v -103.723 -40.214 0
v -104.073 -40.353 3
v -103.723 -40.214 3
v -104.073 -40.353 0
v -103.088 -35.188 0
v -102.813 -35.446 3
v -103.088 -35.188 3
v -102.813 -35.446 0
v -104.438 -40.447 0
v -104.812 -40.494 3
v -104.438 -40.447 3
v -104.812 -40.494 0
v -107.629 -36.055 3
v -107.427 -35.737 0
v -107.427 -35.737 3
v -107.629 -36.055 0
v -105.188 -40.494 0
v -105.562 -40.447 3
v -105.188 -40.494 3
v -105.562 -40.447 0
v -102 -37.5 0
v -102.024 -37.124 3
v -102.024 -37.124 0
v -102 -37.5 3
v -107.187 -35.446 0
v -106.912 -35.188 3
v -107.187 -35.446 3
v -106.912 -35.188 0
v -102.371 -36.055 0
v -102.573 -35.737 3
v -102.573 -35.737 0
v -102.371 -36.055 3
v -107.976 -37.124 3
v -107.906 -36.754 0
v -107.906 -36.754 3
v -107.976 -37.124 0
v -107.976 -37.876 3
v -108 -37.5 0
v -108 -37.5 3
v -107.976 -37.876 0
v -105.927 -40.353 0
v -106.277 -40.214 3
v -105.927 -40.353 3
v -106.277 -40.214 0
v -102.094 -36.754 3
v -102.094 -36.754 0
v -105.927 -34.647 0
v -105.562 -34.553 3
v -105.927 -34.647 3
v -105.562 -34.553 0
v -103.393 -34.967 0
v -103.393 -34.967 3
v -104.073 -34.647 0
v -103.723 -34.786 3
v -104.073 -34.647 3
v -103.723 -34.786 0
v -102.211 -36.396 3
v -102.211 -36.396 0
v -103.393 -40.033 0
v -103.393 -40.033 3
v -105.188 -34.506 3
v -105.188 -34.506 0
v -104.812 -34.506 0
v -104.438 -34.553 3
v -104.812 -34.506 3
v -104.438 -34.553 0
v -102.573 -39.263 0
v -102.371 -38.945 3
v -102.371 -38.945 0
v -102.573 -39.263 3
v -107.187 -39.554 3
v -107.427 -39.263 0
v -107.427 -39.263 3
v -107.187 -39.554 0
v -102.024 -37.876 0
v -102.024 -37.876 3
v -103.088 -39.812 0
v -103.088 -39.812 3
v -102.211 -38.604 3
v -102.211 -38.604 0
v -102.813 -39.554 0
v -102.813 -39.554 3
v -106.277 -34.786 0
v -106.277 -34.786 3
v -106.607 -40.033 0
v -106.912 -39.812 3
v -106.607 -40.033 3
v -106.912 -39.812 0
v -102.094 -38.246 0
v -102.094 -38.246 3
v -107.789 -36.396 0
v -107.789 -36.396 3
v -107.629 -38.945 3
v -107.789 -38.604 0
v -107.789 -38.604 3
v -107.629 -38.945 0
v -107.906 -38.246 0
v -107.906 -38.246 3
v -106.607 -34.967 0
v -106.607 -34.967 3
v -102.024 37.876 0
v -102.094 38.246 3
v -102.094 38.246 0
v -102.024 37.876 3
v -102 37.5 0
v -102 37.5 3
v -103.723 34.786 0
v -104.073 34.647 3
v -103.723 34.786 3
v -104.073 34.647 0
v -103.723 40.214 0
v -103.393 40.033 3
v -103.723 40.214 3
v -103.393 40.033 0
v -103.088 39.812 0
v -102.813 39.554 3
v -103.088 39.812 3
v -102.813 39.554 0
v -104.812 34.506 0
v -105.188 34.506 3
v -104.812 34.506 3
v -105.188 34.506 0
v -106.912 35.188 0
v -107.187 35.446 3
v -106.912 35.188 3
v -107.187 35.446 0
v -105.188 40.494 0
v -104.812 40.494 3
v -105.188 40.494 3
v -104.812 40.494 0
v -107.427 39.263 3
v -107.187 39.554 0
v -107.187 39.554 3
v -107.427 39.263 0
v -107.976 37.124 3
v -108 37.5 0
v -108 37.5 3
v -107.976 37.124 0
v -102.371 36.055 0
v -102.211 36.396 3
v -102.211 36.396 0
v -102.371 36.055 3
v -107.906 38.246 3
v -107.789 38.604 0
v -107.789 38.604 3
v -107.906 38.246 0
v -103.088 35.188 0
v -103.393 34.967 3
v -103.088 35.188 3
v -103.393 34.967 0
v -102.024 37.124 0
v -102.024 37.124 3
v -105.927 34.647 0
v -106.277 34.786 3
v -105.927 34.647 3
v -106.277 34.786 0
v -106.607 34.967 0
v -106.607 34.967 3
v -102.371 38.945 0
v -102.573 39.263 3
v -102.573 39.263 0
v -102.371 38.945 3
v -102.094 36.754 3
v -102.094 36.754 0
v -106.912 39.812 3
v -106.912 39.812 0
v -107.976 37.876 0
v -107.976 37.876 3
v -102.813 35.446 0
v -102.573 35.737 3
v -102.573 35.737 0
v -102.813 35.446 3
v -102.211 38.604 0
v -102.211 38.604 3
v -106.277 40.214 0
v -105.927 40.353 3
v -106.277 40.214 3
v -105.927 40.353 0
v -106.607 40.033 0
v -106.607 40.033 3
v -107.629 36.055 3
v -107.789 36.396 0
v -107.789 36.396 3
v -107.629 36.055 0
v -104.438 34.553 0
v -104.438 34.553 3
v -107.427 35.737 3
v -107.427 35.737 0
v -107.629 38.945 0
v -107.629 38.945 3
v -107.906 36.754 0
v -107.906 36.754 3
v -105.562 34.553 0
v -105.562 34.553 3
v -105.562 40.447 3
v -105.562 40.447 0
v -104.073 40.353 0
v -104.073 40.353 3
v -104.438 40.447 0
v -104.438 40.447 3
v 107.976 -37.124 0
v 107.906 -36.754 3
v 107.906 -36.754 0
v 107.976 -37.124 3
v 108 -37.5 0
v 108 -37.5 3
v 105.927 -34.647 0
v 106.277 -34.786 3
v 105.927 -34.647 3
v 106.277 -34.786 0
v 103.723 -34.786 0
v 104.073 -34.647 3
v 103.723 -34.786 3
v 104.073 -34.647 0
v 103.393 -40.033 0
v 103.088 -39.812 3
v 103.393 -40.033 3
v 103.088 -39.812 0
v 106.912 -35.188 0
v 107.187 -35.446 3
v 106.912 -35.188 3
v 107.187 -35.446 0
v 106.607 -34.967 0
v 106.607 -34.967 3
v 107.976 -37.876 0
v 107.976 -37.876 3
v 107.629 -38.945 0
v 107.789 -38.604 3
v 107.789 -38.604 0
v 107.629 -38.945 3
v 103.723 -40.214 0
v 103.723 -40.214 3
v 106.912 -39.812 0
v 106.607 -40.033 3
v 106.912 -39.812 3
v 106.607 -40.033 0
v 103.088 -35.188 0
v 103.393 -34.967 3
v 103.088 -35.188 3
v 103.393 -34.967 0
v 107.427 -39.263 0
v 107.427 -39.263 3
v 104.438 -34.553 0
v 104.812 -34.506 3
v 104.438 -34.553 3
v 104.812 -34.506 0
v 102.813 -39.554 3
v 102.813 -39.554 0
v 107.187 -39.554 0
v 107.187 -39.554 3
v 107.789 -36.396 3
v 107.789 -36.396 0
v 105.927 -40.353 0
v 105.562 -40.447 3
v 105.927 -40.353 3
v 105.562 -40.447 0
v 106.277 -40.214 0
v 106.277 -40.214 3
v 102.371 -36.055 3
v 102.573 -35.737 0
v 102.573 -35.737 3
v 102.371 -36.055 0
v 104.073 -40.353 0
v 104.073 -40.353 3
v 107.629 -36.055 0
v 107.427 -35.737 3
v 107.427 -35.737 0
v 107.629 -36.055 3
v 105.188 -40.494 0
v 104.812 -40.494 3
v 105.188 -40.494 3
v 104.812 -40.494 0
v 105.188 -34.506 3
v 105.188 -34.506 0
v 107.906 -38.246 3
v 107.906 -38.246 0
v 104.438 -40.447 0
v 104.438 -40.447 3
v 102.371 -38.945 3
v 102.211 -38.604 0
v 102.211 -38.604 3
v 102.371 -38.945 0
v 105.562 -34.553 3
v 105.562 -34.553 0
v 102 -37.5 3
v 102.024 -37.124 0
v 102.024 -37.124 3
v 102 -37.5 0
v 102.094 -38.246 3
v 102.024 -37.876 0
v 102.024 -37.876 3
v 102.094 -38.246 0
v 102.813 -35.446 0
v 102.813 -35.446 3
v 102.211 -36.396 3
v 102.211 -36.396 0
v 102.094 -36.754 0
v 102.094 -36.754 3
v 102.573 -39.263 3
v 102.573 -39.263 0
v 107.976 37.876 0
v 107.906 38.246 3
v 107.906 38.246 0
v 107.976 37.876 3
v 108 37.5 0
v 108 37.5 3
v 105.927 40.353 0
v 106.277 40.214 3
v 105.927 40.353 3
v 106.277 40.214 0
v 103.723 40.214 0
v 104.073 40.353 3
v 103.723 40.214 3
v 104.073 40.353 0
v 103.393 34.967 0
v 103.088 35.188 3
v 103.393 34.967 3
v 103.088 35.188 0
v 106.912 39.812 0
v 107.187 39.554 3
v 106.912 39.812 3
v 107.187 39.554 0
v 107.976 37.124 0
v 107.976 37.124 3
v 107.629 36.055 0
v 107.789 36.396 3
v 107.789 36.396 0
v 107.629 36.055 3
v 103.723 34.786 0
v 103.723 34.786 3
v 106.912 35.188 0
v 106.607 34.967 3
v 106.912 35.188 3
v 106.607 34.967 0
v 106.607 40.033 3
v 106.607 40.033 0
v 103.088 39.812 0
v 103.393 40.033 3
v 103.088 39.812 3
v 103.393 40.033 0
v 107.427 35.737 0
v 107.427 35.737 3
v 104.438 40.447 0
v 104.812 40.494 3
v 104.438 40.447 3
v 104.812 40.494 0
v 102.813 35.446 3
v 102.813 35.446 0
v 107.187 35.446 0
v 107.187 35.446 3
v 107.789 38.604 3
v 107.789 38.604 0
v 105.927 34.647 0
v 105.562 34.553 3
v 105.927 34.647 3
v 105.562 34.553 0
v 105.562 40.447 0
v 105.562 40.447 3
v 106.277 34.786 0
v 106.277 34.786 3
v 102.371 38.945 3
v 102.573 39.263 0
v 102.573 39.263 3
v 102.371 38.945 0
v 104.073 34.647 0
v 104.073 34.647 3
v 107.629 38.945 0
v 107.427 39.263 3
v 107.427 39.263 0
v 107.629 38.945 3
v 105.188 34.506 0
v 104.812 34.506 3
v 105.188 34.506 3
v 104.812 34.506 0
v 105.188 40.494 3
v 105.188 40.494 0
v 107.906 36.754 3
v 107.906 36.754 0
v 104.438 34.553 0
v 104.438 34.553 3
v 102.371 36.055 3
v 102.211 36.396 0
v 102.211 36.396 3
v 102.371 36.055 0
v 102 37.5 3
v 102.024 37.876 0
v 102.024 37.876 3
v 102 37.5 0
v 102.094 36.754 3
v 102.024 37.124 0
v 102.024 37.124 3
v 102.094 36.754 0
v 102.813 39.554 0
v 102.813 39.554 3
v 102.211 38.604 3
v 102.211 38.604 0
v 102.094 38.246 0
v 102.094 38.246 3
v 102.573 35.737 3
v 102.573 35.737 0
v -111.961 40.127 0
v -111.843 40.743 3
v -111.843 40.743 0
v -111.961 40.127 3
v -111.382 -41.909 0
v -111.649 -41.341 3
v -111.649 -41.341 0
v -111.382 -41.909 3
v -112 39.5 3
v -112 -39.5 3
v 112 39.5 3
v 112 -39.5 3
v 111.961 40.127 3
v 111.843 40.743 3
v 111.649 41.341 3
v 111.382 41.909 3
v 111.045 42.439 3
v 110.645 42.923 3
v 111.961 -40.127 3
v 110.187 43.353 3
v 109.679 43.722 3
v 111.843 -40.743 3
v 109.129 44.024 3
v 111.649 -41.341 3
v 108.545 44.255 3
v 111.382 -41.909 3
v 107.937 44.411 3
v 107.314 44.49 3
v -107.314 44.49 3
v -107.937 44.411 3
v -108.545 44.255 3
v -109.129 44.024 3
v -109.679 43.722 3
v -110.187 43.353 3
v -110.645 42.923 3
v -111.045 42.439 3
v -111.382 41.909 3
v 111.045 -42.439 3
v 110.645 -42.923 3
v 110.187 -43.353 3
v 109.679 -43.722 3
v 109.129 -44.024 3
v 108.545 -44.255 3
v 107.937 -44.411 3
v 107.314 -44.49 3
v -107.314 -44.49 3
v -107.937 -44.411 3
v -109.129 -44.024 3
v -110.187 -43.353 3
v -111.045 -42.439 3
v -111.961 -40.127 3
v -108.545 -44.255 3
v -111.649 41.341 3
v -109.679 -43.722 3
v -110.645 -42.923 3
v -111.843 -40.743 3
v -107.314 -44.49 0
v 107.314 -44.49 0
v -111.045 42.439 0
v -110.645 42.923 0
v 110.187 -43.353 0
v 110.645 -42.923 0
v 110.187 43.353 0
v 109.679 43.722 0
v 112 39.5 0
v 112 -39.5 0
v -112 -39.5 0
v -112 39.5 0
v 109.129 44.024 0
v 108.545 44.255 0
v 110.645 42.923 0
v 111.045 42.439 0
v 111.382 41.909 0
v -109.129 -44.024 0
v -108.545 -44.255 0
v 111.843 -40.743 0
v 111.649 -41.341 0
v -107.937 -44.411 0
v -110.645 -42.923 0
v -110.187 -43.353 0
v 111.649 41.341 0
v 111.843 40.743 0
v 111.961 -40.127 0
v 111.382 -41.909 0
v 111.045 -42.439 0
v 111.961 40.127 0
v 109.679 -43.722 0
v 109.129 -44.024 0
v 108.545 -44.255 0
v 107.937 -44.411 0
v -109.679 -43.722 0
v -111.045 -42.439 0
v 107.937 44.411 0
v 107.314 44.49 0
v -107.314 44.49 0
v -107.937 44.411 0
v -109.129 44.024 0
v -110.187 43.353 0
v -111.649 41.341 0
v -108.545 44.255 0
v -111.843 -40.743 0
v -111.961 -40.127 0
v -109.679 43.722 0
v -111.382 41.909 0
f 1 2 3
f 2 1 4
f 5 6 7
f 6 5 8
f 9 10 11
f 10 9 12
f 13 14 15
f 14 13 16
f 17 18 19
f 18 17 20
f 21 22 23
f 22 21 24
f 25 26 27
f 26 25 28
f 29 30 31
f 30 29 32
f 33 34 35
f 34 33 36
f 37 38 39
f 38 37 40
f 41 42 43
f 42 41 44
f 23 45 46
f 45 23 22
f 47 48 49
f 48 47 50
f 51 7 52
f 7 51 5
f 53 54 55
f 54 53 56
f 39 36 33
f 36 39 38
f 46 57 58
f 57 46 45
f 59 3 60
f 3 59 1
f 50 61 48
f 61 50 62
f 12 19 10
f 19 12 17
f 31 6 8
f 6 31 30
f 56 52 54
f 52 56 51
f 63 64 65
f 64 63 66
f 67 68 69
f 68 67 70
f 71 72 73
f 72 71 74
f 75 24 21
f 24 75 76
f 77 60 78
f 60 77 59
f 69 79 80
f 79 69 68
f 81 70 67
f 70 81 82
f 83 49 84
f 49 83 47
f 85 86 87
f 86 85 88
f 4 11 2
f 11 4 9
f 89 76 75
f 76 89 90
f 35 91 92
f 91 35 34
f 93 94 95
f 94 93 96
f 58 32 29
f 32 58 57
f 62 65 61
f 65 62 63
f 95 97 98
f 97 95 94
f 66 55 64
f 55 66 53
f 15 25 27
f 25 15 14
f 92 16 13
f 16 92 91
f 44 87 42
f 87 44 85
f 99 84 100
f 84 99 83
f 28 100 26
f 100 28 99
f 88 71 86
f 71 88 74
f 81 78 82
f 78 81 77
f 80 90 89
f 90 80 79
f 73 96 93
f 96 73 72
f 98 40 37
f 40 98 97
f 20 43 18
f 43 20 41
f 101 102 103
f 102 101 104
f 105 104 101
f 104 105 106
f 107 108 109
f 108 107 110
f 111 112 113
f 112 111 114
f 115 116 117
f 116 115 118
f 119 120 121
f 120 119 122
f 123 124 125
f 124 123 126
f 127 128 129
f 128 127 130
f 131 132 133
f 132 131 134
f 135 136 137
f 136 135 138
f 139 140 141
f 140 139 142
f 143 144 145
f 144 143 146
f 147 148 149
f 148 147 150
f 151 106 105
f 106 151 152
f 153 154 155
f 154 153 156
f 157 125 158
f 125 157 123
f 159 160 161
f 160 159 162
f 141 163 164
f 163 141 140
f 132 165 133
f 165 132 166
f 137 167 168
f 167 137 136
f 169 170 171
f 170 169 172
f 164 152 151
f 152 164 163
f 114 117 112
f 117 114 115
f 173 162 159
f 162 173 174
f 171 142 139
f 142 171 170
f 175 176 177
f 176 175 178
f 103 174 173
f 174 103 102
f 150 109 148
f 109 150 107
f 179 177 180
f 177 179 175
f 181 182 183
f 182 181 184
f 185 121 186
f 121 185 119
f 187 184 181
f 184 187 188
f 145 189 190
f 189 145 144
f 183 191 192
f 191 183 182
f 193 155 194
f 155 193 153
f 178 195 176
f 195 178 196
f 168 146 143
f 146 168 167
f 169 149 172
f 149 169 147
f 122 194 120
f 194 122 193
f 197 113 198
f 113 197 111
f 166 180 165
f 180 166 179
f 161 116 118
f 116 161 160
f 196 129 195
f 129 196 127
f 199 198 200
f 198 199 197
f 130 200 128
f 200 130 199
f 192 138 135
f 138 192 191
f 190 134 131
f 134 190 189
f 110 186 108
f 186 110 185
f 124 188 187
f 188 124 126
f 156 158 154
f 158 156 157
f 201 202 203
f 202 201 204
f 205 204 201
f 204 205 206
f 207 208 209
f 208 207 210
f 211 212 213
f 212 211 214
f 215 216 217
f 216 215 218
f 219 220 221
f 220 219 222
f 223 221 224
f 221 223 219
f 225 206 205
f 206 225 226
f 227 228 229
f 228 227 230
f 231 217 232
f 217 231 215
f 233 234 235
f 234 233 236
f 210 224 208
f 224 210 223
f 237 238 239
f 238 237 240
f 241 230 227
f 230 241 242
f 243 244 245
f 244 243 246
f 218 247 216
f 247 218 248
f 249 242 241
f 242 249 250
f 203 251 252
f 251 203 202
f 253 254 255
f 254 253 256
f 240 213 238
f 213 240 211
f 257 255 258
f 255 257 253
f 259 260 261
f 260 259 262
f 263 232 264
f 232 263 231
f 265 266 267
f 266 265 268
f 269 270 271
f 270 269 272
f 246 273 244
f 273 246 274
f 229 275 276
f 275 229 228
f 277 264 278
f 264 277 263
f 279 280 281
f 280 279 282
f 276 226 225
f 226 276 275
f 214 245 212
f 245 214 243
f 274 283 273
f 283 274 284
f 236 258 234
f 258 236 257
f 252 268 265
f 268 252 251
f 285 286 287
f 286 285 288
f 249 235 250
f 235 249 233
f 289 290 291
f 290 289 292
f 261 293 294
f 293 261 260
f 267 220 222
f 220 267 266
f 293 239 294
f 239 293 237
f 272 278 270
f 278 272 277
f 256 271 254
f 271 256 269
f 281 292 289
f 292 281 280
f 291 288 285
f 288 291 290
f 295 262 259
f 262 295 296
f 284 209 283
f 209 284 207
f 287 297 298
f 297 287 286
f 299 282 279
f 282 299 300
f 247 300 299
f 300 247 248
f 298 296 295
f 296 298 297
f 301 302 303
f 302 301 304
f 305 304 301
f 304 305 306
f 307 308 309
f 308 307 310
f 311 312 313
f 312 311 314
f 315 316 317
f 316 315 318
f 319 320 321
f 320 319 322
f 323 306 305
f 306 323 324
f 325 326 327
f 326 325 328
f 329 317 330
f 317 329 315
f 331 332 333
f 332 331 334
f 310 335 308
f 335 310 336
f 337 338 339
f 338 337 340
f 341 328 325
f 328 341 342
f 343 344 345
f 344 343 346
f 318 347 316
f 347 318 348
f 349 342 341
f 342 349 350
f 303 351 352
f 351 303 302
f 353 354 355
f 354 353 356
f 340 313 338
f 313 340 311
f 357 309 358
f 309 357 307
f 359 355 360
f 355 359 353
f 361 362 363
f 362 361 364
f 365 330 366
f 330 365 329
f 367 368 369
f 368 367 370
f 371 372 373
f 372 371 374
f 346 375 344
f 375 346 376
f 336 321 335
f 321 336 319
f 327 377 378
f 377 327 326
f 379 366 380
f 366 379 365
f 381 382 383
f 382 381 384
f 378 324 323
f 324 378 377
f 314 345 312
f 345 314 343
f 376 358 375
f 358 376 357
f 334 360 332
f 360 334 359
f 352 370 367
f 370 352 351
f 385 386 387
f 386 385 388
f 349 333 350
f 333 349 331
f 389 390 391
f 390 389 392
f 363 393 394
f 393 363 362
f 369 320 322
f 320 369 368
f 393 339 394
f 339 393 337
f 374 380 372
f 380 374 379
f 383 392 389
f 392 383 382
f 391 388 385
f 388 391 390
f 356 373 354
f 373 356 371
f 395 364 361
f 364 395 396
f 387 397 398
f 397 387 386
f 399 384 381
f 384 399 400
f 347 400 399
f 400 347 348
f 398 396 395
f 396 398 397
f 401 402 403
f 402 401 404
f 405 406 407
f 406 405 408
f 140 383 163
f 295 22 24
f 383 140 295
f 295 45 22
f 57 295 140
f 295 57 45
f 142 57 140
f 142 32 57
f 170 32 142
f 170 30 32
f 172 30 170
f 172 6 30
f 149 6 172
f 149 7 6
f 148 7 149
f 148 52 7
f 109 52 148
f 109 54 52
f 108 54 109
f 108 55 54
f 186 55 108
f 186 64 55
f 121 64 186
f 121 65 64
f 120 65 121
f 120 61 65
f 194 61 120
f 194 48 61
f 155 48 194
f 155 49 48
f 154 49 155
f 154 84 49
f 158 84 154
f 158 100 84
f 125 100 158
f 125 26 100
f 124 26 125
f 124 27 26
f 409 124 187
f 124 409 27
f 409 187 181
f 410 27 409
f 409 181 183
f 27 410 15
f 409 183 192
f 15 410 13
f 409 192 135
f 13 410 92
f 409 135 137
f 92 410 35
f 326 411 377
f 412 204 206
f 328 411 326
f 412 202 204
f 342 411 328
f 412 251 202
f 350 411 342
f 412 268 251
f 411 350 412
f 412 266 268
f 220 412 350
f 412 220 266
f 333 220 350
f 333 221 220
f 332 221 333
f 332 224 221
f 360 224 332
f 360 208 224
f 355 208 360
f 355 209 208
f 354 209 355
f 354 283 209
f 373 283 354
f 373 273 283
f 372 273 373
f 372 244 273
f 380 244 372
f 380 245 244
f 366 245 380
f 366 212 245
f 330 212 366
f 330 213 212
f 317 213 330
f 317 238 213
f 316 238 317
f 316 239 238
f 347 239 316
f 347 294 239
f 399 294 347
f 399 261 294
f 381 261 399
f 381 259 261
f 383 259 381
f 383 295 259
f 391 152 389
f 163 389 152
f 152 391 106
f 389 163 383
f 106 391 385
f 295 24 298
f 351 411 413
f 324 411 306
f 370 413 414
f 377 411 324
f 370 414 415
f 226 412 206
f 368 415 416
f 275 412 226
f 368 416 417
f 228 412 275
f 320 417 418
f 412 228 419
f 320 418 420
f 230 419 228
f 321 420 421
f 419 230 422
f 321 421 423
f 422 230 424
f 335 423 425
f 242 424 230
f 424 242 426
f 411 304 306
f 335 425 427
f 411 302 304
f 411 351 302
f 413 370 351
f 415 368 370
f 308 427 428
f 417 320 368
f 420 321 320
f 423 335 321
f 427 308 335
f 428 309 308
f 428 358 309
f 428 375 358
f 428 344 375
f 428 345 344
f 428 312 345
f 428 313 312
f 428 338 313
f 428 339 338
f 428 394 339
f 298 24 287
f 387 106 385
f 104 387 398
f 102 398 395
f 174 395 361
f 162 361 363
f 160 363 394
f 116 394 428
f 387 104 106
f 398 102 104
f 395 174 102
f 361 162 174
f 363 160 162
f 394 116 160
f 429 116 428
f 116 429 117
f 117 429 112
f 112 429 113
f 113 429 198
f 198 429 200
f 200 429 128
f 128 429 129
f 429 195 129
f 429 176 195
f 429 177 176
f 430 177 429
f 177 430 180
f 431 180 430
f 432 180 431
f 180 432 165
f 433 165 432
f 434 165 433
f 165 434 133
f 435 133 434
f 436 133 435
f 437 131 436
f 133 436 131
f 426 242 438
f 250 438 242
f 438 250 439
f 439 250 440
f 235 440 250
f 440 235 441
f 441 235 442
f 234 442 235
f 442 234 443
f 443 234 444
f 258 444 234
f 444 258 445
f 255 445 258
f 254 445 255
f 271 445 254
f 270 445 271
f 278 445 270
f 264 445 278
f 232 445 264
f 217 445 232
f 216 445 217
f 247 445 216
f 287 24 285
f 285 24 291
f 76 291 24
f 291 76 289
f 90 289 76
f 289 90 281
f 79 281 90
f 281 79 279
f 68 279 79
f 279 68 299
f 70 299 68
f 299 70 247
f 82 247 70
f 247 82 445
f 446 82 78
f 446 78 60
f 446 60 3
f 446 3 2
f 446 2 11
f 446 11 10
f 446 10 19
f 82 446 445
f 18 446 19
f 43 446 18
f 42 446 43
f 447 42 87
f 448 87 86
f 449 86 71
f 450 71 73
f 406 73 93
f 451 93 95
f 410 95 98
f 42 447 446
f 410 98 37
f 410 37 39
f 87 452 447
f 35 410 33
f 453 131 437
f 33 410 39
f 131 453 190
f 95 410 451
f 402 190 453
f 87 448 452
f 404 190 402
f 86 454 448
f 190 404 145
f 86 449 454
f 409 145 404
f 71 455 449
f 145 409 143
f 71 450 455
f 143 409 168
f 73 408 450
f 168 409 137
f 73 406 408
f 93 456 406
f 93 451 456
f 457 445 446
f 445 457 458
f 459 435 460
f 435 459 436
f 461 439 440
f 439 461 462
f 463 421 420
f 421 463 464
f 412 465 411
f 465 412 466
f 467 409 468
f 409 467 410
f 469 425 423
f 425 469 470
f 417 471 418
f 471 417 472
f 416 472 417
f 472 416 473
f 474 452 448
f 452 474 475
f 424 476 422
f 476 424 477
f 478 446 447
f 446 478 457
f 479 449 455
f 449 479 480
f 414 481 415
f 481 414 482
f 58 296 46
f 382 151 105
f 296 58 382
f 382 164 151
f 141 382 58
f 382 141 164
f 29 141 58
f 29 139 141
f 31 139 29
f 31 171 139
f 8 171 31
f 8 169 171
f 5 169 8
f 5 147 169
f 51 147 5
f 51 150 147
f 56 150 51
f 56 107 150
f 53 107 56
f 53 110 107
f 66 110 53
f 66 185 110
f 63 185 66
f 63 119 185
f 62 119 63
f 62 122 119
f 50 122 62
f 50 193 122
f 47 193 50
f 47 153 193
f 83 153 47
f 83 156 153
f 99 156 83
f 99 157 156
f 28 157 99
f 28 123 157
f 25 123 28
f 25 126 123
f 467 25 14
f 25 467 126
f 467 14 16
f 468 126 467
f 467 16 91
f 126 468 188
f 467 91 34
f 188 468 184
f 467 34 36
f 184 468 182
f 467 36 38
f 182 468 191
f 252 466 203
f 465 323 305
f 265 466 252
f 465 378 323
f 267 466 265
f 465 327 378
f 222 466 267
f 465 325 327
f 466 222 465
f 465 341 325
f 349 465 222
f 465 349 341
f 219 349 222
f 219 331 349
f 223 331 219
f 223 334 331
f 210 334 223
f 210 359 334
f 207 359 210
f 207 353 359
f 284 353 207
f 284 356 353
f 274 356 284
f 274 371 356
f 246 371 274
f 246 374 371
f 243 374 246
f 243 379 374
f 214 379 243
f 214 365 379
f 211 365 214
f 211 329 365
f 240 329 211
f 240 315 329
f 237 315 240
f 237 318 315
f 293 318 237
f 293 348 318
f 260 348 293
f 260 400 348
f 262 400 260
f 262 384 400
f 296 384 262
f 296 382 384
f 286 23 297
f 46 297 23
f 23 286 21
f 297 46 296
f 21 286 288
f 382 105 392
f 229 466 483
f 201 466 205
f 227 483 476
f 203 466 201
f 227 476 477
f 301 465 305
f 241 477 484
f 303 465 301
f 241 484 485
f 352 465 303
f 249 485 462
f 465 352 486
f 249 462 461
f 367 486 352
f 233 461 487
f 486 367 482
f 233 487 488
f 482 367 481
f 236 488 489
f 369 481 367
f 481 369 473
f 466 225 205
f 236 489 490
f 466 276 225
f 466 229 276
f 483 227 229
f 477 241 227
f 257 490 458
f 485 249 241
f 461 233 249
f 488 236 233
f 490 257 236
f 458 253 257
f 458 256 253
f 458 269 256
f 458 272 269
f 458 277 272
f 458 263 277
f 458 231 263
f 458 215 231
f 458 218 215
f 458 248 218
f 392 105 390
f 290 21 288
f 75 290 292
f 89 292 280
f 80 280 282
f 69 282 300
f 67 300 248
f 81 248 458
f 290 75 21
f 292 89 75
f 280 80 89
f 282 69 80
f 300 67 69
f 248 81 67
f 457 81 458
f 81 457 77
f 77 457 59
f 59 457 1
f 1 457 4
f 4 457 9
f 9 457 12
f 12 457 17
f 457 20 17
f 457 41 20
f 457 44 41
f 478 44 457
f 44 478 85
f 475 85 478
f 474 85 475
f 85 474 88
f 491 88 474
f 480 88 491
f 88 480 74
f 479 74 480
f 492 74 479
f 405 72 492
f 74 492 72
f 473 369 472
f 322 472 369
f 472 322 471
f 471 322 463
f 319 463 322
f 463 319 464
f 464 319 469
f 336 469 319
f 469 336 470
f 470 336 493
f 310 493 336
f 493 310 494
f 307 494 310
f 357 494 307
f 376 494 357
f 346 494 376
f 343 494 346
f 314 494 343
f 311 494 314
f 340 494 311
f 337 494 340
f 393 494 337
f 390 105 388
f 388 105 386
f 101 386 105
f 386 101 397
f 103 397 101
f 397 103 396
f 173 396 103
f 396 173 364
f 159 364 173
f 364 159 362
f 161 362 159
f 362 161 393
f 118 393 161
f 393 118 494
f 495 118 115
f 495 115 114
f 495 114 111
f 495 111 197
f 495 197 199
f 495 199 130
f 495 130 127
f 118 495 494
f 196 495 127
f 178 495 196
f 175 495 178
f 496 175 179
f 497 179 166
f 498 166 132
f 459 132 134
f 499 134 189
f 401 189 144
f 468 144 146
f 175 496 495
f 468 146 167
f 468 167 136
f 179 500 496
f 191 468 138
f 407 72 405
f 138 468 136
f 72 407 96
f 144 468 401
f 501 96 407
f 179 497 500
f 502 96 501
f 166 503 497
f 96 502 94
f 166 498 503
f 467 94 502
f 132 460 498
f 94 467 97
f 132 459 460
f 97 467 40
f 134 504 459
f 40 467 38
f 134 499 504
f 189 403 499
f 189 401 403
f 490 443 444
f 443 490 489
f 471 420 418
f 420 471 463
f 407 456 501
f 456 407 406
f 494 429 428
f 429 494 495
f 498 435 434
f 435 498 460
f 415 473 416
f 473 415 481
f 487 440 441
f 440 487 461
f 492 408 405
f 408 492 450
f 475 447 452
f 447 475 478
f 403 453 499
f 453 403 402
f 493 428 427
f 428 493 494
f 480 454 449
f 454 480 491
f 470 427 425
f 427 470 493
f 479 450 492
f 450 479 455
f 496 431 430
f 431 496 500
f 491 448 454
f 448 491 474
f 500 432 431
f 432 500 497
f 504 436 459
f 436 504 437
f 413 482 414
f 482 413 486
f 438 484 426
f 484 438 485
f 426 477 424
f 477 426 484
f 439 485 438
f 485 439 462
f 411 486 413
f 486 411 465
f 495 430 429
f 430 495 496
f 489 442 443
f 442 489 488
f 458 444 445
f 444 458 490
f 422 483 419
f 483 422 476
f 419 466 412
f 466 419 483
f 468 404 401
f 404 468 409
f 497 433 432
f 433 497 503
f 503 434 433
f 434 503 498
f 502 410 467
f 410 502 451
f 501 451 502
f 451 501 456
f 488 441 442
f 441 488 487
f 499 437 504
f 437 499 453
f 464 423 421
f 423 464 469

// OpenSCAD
$fn = 50;


difference() {
	union() {
		hull() {
			translate(v = [-107.0000000000, 39.5000000000, 0]) {
				cylinder(h = 3, r = 5);
			}
			translate(v = [107.0000000000, 39.5000000000, 0]) {
				cylinder(h = 3, r = 5);
			}
			translate(v = [-107.0000000000, -39.5000000000, 0]) {
				cylinder(h = 3, r = 5);
			}
			translate(v = [107.0000000000, -39.5000000000, 0]) {
				cylinder(h = 3, r = 5);
			}
		}
	}
	union() {
		translate(v = [-105.0000000000, -37.5000000000, -100.0000000000]) {
			cylinder(h = 200, r = 3.0000000000);
		}
		translate(v = [-105.0000000000, 37.5000000000, -100.0000000000]) {
			cylinder(h = 200, r = 3.0000000000);
		}
		translate(v = [105.0000000000, -37.5000000000, -100.0000000000]) {
			cylinder(h = 200, r = 3.0000000000);
		}
		translate(v = [105.0000000000, 37.5000000000, -100.0000000000]) {
			cylinder(h = 200, r = 3.0000000000);
		}
	}
}
